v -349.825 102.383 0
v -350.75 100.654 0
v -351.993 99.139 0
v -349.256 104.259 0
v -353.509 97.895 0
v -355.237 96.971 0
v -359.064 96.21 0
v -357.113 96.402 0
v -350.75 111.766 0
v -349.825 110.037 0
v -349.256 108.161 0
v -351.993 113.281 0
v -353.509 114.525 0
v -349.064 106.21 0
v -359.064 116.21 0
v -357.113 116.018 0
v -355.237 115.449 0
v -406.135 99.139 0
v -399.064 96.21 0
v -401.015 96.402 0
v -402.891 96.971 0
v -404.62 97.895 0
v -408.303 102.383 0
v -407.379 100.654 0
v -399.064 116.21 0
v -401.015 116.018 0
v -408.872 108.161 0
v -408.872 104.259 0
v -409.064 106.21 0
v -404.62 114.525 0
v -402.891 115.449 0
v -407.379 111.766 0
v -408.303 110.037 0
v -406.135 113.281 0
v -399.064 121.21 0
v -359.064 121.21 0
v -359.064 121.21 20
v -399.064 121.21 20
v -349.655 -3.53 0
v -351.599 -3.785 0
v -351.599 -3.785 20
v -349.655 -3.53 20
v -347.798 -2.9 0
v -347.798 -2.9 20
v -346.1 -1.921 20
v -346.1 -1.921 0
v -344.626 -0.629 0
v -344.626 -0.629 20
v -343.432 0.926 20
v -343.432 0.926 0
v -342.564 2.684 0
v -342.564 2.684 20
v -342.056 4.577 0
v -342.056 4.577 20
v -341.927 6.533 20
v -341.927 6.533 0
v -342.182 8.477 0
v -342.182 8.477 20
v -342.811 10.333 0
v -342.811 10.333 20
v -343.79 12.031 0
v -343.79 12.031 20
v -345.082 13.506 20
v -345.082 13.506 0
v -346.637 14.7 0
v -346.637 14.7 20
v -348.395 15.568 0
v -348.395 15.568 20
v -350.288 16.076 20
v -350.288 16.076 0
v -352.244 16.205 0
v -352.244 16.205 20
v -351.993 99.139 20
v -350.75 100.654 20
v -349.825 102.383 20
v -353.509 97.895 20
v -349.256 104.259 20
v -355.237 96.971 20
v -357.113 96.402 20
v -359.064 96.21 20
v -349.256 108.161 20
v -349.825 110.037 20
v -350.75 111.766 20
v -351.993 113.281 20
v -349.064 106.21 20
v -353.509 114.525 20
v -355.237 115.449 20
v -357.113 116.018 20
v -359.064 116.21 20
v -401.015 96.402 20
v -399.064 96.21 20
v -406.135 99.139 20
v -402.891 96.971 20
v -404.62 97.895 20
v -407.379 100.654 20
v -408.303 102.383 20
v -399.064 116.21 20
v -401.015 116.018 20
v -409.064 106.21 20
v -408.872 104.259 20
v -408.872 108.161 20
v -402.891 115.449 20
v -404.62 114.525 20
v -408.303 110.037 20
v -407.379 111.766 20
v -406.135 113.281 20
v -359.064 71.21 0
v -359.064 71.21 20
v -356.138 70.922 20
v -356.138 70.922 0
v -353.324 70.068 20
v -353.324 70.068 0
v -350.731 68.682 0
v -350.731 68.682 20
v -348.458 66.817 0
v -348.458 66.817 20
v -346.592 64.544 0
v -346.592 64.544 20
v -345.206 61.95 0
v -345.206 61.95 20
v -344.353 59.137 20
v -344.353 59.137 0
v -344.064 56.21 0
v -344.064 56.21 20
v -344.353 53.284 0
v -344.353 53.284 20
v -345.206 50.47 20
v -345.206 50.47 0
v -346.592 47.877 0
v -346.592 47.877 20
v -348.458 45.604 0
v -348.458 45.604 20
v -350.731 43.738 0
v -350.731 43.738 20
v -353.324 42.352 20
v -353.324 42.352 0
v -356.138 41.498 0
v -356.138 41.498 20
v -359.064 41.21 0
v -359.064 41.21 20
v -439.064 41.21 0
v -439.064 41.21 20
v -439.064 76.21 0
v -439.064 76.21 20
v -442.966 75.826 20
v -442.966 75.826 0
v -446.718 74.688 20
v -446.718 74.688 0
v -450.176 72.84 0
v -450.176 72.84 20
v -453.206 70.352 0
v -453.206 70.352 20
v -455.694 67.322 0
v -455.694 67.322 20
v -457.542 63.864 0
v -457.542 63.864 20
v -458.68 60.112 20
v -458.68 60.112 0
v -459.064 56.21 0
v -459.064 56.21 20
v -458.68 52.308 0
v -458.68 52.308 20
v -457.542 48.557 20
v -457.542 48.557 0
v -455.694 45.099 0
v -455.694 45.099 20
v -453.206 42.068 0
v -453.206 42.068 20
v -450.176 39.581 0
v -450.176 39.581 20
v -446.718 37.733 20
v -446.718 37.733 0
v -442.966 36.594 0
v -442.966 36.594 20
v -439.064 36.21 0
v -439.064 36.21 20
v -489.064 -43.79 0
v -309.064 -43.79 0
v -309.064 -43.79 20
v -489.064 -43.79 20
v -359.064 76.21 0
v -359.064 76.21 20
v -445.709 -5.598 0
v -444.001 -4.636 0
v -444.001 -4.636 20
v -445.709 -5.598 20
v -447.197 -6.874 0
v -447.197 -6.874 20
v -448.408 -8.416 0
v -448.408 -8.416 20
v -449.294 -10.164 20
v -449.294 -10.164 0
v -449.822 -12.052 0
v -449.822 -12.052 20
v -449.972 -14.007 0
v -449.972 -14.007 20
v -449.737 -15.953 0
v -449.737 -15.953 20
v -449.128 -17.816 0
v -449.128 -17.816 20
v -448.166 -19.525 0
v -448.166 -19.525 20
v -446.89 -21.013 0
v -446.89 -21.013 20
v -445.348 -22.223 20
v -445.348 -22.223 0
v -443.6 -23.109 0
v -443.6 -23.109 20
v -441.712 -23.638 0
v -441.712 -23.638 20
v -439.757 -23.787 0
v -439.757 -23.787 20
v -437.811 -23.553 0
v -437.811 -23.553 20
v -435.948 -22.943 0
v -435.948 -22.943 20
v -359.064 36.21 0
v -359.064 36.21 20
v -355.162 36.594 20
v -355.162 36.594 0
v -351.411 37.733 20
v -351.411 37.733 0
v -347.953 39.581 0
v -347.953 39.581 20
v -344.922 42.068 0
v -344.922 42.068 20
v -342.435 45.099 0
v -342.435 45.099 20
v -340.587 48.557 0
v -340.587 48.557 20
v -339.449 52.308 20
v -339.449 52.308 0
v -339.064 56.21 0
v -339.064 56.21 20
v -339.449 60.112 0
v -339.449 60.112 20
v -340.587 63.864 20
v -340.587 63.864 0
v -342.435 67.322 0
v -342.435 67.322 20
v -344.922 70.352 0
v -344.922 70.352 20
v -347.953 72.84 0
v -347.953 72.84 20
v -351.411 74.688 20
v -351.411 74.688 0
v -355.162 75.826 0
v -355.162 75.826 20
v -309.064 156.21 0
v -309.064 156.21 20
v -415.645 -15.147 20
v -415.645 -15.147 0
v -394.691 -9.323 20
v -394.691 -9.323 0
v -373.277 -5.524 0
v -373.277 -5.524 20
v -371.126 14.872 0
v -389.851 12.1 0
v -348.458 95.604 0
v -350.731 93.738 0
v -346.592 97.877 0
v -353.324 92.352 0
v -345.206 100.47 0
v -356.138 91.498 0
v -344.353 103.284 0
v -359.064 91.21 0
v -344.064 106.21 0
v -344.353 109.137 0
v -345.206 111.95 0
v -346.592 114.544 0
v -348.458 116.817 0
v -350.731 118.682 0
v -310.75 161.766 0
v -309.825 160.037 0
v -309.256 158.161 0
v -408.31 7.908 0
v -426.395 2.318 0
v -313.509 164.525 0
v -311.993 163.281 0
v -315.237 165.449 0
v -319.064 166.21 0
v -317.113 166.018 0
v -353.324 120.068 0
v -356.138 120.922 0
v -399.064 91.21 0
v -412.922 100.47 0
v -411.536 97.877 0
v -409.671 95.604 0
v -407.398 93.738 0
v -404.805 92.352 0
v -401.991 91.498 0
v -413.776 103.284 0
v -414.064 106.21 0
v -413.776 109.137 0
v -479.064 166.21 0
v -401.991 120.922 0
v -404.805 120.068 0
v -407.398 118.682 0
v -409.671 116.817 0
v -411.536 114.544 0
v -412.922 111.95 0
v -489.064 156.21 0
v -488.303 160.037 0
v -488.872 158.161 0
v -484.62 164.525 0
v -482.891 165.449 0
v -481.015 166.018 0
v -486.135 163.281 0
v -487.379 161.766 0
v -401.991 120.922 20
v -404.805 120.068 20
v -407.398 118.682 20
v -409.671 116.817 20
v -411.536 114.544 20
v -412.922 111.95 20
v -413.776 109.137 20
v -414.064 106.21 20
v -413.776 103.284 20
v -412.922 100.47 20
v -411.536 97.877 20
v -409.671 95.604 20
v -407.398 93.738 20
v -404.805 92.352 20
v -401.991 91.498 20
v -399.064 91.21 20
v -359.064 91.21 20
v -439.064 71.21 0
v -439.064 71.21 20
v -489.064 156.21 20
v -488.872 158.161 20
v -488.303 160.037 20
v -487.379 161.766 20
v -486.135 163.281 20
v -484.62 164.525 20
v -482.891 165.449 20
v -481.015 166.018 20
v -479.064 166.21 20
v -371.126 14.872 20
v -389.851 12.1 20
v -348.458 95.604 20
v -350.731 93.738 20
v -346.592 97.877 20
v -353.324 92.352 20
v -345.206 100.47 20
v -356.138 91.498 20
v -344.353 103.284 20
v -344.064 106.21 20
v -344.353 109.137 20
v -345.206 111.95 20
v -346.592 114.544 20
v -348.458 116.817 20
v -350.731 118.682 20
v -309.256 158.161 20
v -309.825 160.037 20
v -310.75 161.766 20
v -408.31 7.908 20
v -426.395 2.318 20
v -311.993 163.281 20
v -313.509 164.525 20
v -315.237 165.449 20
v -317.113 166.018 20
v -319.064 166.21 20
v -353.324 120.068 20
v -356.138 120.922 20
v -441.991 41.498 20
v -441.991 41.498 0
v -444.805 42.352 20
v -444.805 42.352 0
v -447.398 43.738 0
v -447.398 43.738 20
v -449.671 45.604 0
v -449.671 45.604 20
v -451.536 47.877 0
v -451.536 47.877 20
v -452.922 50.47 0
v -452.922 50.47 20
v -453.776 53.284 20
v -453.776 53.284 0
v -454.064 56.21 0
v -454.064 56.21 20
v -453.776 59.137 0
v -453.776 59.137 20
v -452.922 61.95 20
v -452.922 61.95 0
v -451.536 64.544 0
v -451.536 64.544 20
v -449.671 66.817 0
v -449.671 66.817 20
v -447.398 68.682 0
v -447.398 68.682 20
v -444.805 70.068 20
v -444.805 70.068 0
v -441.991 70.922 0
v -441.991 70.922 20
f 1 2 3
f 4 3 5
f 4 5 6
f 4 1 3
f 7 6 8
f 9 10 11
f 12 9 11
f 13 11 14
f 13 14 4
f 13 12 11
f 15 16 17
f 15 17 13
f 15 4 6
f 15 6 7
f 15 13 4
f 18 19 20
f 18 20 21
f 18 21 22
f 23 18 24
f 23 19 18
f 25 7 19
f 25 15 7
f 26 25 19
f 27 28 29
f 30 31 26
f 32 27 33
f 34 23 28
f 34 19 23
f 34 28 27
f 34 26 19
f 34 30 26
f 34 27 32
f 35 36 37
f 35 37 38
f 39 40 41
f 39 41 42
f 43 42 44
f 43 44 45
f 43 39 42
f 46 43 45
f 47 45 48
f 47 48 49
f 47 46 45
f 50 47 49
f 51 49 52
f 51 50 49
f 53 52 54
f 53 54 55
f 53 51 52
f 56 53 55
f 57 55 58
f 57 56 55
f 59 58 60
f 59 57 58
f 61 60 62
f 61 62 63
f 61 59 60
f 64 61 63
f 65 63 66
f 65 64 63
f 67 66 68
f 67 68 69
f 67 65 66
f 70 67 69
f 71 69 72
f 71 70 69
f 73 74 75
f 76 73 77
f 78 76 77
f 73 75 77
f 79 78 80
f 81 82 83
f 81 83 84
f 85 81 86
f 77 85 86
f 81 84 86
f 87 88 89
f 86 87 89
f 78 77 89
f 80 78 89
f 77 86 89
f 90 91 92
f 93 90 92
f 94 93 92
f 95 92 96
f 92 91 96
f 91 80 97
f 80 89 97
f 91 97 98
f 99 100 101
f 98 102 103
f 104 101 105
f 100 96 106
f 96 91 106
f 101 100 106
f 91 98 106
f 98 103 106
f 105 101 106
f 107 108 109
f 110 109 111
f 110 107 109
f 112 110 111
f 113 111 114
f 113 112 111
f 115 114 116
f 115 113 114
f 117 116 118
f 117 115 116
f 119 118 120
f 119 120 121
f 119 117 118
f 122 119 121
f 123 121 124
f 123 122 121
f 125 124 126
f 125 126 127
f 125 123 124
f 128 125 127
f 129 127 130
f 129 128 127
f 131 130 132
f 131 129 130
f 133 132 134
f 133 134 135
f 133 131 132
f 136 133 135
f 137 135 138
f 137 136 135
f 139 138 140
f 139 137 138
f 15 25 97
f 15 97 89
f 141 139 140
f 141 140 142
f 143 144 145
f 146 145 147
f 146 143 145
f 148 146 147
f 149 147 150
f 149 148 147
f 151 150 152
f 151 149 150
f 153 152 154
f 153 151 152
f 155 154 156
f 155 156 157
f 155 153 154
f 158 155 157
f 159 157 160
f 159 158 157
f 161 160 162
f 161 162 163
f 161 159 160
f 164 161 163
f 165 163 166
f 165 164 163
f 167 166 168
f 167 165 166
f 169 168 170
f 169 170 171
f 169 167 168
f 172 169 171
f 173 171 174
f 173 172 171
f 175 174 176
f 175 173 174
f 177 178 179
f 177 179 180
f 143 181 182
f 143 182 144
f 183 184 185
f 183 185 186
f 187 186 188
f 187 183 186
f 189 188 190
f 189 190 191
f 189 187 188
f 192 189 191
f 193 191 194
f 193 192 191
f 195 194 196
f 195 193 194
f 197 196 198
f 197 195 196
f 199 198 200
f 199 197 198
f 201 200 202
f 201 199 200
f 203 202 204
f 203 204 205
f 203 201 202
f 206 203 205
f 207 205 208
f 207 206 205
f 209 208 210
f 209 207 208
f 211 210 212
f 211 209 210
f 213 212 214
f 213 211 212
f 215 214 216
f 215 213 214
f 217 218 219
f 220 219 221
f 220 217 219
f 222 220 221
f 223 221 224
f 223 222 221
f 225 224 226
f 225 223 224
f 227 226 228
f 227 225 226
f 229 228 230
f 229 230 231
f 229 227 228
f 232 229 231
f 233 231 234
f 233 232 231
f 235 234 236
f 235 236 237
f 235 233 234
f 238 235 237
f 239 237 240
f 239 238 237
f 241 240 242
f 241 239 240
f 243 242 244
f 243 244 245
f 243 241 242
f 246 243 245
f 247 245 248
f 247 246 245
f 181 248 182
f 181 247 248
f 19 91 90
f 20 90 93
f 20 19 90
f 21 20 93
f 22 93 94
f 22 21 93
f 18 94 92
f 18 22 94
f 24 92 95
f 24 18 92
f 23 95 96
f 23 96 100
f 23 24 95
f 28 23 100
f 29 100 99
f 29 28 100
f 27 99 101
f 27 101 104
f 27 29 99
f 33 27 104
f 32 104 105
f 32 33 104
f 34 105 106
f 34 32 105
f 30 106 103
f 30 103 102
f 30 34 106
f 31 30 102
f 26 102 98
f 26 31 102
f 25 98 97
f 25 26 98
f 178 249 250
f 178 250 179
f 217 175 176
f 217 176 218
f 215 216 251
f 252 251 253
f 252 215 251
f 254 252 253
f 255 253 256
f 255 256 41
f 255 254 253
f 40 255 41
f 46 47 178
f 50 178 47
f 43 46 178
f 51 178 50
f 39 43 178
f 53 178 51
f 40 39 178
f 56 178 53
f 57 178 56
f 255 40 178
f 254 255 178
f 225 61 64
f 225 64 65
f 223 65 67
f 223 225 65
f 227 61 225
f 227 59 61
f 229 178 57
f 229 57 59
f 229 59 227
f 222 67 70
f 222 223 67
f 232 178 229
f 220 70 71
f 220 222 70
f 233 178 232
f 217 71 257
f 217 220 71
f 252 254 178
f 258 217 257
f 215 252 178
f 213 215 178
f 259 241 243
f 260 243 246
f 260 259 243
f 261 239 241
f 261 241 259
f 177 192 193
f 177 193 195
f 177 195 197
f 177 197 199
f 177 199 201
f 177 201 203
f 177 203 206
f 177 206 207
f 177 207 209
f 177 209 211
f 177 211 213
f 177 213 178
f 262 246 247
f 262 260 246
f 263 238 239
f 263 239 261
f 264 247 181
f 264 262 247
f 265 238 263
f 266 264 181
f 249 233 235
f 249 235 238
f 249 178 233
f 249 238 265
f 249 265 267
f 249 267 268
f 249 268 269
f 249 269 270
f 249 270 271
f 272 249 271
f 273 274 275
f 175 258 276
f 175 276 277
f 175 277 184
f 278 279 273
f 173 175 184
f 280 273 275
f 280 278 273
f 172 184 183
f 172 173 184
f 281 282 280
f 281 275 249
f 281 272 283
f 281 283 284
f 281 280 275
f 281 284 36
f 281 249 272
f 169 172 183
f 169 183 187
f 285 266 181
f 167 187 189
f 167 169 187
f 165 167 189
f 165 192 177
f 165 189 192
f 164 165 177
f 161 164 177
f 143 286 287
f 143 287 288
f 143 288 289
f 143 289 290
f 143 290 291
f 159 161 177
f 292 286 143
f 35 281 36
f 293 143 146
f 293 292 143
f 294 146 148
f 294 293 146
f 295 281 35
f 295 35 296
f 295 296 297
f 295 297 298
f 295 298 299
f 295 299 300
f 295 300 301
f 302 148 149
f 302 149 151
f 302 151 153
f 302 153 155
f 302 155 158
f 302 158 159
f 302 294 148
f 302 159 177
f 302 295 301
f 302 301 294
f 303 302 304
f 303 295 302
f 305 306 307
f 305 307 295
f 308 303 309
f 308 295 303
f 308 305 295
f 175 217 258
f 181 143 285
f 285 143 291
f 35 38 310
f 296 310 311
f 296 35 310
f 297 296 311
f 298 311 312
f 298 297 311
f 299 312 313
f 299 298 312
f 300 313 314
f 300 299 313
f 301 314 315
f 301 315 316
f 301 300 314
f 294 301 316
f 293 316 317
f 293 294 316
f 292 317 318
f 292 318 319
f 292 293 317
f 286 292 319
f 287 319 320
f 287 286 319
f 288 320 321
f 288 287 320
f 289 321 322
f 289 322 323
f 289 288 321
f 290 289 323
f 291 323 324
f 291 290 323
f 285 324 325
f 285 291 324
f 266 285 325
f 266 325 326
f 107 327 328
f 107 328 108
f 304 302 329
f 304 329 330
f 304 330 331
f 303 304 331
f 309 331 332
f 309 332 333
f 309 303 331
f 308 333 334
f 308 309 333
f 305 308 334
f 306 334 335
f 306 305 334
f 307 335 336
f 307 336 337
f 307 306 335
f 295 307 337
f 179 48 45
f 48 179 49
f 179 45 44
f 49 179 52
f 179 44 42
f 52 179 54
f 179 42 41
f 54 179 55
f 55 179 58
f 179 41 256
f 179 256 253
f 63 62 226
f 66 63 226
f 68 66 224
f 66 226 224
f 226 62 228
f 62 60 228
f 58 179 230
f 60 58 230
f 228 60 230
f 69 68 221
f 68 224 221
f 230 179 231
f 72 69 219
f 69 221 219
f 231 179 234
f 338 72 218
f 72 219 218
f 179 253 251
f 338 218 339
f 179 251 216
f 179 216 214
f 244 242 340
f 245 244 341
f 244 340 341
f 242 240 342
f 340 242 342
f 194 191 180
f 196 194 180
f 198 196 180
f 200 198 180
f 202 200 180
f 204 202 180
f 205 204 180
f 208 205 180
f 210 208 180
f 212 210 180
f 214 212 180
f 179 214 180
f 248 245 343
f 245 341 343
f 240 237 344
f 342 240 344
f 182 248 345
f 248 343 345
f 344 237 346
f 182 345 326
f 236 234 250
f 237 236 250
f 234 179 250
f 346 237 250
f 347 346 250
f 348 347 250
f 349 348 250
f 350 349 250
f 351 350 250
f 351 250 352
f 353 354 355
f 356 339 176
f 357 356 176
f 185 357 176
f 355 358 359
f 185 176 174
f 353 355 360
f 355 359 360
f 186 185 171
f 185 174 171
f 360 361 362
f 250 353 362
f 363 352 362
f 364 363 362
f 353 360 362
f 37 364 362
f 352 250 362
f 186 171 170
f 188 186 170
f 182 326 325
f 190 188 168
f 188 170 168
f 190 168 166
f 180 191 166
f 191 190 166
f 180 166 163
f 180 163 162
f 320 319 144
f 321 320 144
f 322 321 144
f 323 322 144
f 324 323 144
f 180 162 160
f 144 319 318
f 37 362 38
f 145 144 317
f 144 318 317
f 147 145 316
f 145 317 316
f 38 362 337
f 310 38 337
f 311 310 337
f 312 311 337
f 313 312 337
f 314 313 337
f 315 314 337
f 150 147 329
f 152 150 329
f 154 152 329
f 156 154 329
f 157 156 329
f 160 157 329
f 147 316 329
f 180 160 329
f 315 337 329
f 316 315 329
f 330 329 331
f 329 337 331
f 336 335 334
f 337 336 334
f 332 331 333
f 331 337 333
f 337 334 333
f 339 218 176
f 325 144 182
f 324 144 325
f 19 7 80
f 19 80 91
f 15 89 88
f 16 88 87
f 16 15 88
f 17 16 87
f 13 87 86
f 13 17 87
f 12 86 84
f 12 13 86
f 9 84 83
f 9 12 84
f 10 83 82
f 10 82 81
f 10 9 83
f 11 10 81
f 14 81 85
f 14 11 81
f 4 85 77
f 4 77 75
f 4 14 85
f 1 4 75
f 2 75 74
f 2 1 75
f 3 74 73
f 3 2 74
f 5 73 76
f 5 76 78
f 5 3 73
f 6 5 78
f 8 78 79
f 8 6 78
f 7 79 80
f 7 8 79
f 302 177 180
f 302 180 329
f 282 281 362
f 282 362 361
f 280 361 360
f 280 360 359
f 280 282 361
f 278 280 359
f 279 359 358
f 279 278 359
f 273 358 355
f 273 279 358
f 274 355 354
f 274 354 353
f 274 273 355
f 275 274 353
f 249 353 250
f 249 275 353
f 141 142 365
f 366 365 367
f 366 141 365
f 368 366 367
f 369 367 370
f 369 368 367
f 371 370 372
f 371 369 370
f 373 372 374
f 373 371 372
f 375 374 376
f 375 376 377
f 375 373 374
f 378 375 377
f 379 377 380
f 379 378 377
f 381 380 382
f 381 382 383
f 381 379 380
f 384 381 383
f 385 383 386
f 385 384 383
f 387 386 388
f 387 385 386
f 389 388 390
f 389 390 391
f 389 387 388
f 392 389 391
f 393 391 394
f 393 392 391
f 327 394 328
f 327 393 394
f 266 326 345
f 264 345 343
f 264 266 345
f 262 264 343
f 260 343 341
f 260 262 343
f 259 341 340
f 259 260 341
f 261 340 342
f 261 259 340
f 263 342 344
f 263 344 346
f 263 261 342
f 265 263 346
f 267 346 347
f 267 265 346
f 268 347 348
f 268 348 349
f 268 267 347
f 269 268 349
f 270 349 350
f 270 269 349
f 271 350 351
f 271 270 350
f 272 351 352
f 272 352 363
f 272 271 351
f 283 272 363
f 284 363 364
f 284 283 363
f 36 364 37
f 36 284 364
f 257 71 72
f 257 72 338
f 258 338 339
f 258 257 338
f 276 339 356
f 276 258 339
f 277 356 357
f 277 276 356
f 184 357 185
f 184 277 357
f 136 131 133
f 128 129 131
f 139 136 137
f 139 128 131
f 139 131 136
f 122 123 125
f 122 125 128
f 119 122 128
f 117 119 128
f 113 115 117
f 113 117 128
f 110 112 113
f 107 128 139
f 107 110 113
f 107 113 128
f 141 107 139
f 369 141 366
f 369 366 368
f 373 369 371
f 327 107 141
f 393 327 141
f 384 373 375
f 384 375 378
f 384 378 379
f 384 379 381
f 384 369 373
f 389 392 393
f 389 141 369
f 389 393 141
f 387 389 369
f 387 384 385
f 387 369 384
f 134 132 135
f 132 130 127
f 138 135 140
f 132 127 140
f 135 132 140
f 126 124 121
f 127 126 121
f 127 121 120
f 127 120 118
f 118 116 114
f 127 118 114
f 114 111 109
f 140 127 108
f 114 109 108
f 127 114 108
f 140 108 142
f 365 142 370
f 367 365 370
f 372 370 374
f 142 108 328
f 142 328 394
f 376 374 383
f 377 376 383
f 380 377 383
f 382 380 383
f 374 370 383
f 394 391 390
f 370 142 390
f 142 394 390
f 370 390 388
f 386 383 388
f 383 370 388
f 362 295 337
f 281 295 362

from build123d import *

# Parameters (mm, degrees)
EXTRUDE_10_DEPTH   = 20
EXTRUDE_10_2_DEPTH = 20
EXTRUDE_10_3_DEPTH = 20


with BuildPart() as part:
    # 草图1 → 凸台-拉伸10 (new body)
    with BuildSketch(Plane.XY):
        with BuildLine():
            Line((-479.064282439, 166.210178848), (-319.064282439, 166.210178848))
            ThreePointArc((-319.064282439, 166.210178848), (-311.993214627, 163.28124666), (-309.064282439, 156.210178848))
            Line((-309.064282439, 156.210178848), (-309.064282439, -43.789821152))
            Line((-309.064282439, -43.789821152), (-489.064282439, -43.789821152))
            Line((-489.064282439, -43.789821152), (-489.064282439, 156.210178848))
            ThreePointArc((-489.064282439, 156.210178848), (-486.135350251, 163.28124666), (-479.064282439, 166.210178848))
        make_face()
        with BuildLine():
            ThreePointArc((-444.000712398, -4.636250166), (-449.127853425, -17.81625111), (-435.947852481, -22.943392137))
            ThreePointArc((-435.947852481, -22.943392137), (-394.691102087, -9.322850403), (-351.598568154, -3.784607956))
            ThreePointArc((-351.598568154, -3.784607956), (-341.926638492, 6.533035991), (-352.244282439, 16.204965653))
            ThreePointArc((-352.244282439, 16.204965653), (-399.120993998, 10.180381577), (-444.000712398, -4.636250166))
        make_face(mode=Mode.SUBTRACT)
        with BuildLine():
            ThreePointArc((-359.064282439, 36.210178848), (-339.064282439, 56.210178848), (-359.064282439, 76.210178848))
            Line((-359.064282439, 76.210178848), (-439.064282439, 76.210178848))
            ThreePointArc((-439.064282439, 76.210178848), (-459.064282439, 56.210178848), (-439.064282439, 36.210178848))
            Line((-439.064282439, 36.210178848), (-359.064282439, 36.210178848))
        make_face(mode=Mode.SUBTRACT)
        with BuildLine():
            ThreePointArc((-359.064282439, 91.210178848), (-344.064282439, 106.210178848), (-359.064282439, 121.210178848))
            Line((-359.064282439, 121.210178848), (-399.064282439, 121.210178848))
            ThreePointArc((-399.064282439, 121.210178848), (-414.064282439, 106.210178848), (-399.064282439, 91.210178848))
            Line((-399.064282439, 91.210178848), (-359.064282439, 91.210178848))
        make_face(mode=Mode.SUBTRACT)
    extrude(amount=EXTRUDE_10_DEPTH)


with BuildPart() as body_2:
    # 草图1 → Extrude 10 2 (new body)
    with BuildSketch(Plane.XY):
        with BuildLine():
            Line((-399.064282439, 116.210178848), (-359.064282439, 116.210178848))
            ThreePointArc((-359.064282439, 116.210178848), (-349.064282439, 106.210178848), (-359.064282439, 96.210178848))
            Line((-359.064282439, 96.210178848), (-399.064282439, 96.210178848))
            ThreePointArc((-399.064282439, 96.210178848), (-409.064282439, 106.210178848), (-399.064282439, 116.210178848))
        make_face()
    extrude(amount=EXTRUDE_10_2_DEPTH)


with BuildPart() as body_3:
    # 草图1 → Extrude 10 3 (new body)
    with BuildSketch(Plane.XY):
        with BuildLine():
            Line((-439.064282439, 71.210178848), (-359.064282439, 71.210178848))
            ThreePointArc((-359.064282439, 71.210178848), (-344.064282439, 56.210178848), (-359.064282439, 41.210178848))
            Line((-359.064282439, 41.210178848), (-439.064282439, 41.210178848))
            ThreePointArc((-439.064282439, 41.210178848), (-454.064282439, 56.210178848), (-439.064282439, 71.210178848))
        make_face()
    extrude(amount=EXTRUDE_10_3_DEPTH)


solid = Compound([part.part, body_2.part, body_3.part])
